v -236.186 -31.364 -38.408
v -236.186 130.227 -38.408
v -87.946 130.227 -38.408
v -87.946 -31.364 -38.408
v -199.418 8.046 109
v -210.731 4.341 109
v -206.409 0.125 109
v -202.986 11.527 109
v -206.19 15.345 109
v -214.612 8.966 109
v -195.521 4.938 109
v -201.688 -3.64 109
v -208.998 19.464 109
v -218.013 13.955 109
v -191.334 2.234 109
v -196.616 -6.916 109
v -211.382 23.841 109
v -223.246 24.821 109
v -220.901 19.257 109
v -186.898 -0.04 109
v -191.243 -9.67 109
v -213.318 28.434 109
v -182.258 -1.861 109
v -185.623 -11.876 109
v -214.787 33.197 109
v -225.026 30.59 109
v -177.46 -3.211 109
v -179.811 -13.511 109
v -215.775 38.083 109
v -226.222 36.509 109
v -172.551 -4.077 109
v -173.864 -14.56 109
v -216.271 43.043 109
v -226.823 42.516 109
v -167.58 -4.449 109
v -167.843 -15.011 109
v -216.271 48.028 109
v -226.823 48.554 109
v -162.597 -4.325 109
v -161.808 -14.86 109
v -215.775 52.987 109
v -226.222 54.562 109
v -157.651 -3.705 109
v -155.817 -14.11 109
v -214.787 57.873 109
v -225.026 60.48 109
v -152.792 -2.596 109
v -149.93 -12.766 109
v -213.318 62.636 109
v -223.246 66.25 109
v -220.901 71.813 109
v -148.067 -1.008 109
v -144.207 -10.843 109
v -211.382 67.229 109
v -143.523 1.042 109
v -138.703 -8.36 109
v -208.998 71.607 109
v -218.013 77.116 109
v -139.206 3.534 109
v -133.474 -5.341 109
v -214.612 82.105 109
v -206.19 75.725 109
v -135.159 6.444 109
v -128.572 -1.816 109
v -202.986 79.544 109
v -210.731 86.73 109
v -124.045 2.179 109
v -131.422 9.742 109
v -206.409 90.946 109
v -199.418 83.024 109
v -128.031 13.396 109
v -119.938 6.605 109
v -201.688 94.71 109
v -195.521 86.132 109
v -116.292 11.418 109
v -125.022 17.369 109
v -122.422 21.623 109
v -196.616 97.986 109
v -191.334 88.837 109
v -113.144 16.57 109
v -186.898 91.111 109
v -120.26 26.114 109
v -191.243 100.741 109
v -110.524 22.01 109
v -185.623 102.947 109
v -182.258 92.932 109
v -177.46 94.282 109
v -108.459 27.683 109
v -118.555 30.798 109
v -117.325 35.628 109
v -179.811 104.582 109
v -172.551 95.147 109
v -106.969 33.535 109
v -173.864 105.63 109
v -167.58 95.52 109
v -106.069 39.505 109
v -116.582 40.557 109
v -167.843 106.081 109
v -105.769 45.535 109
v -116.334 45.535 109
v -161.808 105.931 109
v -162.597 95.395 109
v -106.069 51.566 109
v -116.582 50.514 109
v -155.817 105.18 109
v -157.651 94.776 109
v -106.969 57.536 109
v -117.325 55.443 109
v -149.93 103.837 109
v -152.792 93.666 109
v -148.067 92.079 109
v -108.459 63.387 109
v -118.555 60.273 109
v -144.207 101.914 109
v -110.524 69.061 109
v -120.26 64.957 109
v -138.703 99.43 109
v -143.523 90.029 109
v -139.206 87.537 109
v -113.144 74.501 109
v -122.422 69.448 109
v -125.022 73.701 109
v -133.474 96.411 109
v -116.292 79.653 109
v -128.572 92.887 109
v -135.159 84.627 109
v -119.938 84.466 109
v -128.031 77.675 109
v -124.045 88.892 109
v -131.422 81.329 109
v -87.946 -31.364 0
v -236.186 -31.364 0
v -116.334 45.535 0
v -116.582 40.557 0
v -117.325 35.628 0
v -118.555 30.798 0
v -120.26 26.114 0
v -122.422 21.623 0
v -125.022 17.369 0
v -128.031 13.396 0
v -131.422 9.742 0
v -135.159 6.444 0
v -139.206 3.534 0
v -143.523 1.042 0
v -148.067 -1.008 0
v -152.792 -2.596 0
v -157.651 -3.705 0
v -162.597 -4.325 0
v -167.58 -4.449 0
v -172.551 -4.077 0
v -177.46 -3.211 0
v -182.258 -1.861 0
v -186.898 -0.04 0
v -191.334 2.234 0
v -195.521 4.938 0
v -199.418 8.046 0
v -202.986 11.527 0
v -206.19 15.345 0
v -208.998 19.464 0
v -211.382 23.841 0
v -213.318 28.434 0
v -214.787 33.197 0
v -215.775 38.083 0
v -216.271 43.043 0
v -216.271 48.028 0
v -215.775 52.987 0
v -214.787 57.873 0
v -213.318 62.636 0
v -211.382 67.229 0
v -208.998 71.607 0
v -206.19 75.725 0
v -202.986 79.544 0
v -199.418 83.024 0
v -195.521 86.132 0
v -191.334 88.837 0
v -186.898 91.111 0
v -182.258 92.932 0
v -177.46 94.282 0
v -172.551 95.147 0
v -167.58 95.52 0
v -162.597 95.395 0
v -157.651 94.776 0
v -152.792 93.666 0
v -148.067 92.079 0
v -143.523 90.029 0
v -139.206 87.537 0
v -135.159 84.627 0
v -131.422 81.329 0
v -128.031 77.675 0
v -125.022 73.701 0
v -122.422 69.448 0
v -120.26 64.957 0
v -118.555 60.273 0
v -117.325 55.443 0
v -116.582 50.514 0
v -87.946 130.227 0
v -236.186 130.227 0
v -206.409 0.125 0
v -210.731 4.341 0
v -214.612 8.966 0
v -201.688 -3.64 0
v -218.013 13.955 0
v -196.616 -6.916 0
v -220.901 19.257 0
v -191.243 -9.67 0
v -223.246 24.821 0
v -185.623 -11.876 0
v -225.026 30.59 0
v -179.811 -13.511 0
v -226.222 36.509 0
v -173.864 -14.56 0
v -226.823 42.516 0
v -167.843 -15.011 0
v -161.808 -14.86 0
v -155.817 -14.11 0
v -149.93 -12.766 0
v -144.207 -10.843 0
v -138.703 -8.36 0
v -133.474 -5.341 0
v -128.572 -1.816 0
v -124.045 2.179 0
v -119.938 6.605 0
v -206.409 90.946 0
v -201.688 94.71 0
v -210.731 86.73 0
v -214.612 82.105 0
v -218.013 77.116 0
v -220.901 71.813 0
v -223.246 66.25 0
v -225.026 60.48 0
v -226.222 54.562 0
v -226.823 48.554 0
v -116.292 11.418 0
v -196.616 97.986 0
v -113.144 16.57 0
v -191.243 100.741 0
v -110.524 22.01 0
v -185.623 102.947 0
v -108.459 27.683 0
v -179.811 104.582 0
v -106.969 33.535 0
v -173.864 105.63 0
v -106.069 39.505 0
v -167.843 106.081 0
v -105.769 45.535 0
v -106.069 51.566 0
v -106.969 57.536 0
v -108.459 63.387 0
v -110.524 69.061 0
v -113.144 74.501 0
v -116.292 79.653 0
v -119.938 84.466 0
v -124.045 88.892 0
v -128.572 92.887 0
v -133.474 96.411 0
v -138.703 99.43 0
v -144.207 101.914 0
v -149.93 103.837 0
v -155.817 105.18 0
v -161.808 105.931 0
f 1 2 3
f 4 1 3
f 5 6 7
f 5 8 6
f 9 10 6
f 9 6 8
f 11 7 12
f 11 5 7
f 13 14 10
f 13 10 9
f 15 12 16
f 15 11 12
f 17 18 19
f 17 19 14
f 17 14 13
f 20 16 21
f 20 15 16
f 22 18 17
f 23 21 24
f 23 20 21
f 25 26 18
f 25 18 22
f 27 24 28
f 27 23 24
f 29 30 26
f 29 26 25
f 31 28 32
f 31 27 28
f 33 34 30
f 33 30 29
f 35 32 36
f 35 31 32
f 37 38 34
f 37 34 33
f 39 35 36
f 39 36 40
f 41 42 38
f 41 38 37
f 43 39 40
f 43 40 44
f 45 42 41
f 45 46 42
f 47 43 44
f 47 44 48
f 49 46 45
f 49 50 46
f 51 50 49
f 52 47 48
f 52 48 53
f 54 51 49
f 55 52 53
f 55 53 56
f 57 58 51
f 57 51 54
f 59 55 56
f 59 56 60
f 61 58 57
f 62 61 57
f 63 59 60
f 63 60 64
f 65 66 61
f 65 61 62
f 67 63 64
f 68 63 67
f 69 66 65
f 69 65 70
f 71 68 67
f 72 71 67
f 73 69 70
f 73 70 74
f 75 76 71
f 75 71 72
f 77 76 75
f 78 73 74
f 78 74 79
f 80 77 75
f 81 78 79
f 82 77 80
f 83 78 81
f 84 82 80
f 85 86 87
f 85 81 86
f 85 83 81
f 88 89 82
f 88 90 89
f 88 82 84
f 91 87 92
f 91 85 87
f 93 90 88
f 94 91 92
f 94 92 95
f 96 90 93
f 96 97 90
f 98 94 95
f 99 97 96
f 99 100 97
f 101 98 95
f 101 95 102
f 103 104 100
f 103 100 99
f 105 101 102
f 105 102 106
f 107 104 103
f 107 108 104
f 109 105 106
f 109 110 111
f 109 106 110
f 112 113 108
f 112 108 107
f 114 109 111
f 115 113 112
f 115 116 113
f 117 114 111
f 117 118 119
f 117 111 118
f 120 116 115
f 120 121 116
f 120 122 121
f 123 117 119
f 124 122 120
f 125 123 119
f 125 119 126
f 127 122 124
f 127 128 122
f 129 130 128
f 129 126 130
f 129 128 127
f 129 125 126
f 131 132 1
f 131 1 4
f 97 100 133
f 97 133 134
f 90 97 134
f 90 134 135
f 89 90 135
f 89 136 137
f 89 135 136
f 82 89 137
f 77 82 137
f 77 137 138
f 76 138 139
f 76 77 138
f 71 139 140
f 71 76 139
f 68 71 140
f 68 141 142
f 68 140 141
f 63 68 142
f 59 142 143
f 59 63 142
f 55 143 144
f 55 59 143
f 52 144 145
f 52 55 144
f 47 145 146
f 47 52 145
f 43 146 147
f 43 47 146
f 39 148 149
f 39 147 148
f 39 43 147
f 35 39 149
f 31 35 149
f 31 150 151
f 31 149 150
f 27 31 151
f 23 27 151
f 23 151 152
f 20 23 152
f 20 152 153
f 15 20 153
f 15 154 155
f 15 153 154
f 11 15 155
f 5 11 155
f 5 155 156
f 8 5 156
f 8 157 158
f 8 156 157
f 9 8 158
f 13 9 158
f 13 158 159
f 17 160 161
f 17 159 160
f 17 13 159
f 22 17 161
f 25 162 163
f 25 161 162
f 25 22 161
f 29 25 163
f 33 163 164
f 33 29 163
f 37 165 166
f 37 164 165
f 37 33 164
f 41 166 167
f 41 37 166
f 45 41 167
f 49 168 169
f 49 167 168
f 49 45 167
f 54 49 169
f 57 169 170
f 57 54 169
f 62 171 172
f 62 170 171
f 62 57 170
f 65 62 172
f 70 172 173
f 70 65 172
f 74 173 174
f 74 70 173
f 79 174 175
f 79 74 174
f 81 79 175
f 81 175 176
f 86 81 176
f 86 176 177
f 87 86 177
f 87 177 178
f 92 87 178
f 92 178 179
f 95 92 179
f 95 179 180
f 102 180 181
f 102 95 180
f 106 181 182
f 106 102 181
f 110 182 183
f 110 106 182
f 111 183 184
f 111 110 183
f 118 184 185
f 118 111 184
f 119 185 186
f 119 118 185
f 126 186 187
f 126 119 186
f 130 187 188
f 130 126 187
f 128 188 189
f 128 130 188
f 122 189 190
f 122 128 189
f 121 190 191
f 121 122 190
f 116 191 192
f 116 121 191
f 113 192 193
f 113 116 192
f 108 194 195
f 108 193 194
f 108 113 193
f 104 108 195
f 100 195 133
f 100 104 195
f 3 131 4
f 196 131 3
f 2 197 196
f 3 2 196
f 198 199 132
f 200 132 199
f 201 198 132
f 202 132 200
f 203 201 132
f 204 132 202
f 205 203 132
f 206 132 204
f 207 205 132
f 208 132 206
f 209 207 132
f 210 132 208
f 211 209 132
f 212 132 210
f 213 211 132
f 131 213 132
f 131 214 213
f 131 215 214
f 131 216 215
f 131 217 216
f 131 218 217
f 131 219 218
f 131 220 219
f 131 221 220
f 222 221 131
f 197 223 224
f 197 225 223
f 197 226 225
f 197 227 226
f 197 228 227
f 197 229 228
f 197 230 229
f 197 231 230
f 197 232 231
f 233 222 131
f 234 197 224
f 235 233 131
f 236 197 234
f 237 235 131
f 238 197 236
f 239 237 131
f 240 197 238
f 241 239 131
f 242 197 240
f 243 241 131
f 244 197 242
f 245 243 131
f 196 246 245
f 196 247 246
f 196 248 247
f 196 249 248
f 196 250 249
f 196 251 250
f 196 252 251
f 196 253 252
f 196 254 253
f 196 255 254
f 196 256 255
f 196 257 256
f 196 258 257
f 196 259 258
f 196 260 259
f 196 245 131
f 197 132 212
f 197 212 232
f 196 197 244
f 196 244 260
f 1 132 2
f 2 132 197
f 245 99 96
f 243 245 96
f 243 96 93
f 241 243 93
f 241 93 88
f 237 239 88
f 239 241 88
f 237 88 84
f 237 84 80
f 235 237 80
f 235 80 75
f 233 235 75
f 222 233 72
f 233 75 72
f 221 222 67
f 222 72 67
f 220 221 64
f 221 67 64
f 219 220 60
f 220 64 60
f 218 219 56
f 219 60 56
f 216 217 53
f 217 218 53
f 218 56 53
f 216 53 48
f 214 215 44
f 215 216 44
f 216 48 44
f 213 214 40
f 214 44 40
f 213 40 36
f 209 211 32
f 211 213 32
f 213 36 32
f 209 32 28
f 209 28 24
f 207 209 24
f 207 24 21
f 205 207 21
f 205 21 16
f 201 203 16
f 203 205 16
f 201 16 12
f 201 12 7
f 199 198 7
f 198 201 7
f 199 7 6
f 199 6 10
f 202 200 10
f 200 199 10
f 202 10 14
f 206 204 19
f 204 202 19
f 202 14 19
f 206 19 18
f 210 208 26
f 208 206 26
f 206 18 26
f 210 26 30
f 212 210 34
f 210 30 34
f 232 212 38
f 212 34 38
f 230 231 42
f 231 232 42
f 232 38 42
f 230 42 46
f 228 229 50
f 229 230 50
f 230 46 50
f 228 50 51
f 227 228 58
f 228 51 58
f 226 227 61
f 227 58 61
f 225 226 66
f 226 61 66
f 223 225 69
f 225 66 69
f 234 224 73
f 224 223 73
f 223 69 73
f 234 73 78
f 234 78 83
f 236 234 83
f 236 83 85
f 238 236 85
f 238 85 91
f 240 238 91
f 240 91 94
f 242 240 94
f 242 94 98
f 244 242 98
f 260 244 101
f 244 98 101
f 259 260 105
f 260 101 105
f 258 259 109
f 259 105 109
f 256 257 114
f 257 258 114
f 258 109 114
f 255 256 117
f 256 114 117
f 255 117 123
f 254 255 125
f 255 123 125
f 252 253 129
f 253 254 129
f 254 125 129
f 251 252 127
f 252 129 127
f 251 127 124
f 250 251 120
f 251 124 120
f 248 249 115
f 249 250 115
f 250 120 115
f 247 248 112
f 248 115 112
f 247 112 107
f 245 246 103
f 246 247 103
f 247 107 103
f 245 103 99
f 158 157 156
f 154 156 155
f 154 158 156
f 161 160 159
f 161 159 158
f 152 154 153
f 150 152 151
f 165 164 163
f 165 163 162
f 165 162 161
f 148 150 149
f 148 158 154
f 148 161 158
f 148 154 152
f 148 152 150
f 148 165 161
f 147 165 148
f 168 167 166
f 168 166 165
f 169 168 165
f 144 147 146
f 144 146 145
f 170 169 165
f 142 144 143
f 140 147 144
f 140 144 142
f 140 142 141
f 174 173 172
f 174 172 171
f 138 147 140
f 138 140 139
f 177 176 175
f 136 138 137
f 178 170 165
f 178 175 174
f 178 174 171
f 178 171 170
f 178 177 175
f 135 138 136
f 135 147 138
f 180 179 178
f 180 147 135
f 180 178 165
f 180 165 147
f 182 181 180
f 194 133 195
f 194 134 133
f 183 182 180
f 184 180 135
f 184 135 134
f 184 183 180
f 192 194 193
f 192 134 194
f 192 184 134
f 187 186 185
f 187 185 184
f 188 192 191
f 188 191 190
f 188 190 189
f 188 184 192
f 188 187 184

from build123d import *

# Parameters (mm, degrees)
F0_R        = 60.565035
F0_R_2      = 50
F1_DEPTH    = 109
F1_FACE_R   = 60.565035
F1_FACE_R_2 = 50
F2_DEPTH    = 25
F3_W        = 148.240149
F3_H        = 161.59083
F4_DEPTH    = 38.407663


with BuildPart() as f1:
    # F0 (on Top) → F1 (new body)
    with BuildSketch(Plane.XY):
        with Locations((-166.333571, 45.535278)):
            Circle(F0_R)
        with Locations((-166.333571, 45.535278)):
            Circle(F0_R_2, mode=Mode.SUBTRACT)
    extrude(amount=F1_DEPTH)

    # F1_face (on face) + F0 (on Top) → F2 (join)
    with BuildSketch(Plane(origin=(-166.333571, 45.535278, 0), x_dir=(1, 0, 0), z_dir=(0, 0, -1))):
        Circle(F1_FACE_R)
        Circle(F1_FACE_R_2, mode=Mode.SUBTRACT)
    with BuildSketch(Plane.XY):
        with Locations((-166.333571, 45.535278)):
            Circle(F0_R)
        with Locations((-166.333571, 45.535278)):
            Circle(F0_R_2, mode=Mode.SUBTRACT)
    extrude(amount=F2_DEPTH)

    # F3 (on Top) → F4 (join)
    with BuildSketch(Plane.XY):
        with Locations((-162.065908, 49.431123)):
            Rectangle(F3_W, F3_H)
    extrude(amount=-F4_DEPTH)


solid = f1.part
